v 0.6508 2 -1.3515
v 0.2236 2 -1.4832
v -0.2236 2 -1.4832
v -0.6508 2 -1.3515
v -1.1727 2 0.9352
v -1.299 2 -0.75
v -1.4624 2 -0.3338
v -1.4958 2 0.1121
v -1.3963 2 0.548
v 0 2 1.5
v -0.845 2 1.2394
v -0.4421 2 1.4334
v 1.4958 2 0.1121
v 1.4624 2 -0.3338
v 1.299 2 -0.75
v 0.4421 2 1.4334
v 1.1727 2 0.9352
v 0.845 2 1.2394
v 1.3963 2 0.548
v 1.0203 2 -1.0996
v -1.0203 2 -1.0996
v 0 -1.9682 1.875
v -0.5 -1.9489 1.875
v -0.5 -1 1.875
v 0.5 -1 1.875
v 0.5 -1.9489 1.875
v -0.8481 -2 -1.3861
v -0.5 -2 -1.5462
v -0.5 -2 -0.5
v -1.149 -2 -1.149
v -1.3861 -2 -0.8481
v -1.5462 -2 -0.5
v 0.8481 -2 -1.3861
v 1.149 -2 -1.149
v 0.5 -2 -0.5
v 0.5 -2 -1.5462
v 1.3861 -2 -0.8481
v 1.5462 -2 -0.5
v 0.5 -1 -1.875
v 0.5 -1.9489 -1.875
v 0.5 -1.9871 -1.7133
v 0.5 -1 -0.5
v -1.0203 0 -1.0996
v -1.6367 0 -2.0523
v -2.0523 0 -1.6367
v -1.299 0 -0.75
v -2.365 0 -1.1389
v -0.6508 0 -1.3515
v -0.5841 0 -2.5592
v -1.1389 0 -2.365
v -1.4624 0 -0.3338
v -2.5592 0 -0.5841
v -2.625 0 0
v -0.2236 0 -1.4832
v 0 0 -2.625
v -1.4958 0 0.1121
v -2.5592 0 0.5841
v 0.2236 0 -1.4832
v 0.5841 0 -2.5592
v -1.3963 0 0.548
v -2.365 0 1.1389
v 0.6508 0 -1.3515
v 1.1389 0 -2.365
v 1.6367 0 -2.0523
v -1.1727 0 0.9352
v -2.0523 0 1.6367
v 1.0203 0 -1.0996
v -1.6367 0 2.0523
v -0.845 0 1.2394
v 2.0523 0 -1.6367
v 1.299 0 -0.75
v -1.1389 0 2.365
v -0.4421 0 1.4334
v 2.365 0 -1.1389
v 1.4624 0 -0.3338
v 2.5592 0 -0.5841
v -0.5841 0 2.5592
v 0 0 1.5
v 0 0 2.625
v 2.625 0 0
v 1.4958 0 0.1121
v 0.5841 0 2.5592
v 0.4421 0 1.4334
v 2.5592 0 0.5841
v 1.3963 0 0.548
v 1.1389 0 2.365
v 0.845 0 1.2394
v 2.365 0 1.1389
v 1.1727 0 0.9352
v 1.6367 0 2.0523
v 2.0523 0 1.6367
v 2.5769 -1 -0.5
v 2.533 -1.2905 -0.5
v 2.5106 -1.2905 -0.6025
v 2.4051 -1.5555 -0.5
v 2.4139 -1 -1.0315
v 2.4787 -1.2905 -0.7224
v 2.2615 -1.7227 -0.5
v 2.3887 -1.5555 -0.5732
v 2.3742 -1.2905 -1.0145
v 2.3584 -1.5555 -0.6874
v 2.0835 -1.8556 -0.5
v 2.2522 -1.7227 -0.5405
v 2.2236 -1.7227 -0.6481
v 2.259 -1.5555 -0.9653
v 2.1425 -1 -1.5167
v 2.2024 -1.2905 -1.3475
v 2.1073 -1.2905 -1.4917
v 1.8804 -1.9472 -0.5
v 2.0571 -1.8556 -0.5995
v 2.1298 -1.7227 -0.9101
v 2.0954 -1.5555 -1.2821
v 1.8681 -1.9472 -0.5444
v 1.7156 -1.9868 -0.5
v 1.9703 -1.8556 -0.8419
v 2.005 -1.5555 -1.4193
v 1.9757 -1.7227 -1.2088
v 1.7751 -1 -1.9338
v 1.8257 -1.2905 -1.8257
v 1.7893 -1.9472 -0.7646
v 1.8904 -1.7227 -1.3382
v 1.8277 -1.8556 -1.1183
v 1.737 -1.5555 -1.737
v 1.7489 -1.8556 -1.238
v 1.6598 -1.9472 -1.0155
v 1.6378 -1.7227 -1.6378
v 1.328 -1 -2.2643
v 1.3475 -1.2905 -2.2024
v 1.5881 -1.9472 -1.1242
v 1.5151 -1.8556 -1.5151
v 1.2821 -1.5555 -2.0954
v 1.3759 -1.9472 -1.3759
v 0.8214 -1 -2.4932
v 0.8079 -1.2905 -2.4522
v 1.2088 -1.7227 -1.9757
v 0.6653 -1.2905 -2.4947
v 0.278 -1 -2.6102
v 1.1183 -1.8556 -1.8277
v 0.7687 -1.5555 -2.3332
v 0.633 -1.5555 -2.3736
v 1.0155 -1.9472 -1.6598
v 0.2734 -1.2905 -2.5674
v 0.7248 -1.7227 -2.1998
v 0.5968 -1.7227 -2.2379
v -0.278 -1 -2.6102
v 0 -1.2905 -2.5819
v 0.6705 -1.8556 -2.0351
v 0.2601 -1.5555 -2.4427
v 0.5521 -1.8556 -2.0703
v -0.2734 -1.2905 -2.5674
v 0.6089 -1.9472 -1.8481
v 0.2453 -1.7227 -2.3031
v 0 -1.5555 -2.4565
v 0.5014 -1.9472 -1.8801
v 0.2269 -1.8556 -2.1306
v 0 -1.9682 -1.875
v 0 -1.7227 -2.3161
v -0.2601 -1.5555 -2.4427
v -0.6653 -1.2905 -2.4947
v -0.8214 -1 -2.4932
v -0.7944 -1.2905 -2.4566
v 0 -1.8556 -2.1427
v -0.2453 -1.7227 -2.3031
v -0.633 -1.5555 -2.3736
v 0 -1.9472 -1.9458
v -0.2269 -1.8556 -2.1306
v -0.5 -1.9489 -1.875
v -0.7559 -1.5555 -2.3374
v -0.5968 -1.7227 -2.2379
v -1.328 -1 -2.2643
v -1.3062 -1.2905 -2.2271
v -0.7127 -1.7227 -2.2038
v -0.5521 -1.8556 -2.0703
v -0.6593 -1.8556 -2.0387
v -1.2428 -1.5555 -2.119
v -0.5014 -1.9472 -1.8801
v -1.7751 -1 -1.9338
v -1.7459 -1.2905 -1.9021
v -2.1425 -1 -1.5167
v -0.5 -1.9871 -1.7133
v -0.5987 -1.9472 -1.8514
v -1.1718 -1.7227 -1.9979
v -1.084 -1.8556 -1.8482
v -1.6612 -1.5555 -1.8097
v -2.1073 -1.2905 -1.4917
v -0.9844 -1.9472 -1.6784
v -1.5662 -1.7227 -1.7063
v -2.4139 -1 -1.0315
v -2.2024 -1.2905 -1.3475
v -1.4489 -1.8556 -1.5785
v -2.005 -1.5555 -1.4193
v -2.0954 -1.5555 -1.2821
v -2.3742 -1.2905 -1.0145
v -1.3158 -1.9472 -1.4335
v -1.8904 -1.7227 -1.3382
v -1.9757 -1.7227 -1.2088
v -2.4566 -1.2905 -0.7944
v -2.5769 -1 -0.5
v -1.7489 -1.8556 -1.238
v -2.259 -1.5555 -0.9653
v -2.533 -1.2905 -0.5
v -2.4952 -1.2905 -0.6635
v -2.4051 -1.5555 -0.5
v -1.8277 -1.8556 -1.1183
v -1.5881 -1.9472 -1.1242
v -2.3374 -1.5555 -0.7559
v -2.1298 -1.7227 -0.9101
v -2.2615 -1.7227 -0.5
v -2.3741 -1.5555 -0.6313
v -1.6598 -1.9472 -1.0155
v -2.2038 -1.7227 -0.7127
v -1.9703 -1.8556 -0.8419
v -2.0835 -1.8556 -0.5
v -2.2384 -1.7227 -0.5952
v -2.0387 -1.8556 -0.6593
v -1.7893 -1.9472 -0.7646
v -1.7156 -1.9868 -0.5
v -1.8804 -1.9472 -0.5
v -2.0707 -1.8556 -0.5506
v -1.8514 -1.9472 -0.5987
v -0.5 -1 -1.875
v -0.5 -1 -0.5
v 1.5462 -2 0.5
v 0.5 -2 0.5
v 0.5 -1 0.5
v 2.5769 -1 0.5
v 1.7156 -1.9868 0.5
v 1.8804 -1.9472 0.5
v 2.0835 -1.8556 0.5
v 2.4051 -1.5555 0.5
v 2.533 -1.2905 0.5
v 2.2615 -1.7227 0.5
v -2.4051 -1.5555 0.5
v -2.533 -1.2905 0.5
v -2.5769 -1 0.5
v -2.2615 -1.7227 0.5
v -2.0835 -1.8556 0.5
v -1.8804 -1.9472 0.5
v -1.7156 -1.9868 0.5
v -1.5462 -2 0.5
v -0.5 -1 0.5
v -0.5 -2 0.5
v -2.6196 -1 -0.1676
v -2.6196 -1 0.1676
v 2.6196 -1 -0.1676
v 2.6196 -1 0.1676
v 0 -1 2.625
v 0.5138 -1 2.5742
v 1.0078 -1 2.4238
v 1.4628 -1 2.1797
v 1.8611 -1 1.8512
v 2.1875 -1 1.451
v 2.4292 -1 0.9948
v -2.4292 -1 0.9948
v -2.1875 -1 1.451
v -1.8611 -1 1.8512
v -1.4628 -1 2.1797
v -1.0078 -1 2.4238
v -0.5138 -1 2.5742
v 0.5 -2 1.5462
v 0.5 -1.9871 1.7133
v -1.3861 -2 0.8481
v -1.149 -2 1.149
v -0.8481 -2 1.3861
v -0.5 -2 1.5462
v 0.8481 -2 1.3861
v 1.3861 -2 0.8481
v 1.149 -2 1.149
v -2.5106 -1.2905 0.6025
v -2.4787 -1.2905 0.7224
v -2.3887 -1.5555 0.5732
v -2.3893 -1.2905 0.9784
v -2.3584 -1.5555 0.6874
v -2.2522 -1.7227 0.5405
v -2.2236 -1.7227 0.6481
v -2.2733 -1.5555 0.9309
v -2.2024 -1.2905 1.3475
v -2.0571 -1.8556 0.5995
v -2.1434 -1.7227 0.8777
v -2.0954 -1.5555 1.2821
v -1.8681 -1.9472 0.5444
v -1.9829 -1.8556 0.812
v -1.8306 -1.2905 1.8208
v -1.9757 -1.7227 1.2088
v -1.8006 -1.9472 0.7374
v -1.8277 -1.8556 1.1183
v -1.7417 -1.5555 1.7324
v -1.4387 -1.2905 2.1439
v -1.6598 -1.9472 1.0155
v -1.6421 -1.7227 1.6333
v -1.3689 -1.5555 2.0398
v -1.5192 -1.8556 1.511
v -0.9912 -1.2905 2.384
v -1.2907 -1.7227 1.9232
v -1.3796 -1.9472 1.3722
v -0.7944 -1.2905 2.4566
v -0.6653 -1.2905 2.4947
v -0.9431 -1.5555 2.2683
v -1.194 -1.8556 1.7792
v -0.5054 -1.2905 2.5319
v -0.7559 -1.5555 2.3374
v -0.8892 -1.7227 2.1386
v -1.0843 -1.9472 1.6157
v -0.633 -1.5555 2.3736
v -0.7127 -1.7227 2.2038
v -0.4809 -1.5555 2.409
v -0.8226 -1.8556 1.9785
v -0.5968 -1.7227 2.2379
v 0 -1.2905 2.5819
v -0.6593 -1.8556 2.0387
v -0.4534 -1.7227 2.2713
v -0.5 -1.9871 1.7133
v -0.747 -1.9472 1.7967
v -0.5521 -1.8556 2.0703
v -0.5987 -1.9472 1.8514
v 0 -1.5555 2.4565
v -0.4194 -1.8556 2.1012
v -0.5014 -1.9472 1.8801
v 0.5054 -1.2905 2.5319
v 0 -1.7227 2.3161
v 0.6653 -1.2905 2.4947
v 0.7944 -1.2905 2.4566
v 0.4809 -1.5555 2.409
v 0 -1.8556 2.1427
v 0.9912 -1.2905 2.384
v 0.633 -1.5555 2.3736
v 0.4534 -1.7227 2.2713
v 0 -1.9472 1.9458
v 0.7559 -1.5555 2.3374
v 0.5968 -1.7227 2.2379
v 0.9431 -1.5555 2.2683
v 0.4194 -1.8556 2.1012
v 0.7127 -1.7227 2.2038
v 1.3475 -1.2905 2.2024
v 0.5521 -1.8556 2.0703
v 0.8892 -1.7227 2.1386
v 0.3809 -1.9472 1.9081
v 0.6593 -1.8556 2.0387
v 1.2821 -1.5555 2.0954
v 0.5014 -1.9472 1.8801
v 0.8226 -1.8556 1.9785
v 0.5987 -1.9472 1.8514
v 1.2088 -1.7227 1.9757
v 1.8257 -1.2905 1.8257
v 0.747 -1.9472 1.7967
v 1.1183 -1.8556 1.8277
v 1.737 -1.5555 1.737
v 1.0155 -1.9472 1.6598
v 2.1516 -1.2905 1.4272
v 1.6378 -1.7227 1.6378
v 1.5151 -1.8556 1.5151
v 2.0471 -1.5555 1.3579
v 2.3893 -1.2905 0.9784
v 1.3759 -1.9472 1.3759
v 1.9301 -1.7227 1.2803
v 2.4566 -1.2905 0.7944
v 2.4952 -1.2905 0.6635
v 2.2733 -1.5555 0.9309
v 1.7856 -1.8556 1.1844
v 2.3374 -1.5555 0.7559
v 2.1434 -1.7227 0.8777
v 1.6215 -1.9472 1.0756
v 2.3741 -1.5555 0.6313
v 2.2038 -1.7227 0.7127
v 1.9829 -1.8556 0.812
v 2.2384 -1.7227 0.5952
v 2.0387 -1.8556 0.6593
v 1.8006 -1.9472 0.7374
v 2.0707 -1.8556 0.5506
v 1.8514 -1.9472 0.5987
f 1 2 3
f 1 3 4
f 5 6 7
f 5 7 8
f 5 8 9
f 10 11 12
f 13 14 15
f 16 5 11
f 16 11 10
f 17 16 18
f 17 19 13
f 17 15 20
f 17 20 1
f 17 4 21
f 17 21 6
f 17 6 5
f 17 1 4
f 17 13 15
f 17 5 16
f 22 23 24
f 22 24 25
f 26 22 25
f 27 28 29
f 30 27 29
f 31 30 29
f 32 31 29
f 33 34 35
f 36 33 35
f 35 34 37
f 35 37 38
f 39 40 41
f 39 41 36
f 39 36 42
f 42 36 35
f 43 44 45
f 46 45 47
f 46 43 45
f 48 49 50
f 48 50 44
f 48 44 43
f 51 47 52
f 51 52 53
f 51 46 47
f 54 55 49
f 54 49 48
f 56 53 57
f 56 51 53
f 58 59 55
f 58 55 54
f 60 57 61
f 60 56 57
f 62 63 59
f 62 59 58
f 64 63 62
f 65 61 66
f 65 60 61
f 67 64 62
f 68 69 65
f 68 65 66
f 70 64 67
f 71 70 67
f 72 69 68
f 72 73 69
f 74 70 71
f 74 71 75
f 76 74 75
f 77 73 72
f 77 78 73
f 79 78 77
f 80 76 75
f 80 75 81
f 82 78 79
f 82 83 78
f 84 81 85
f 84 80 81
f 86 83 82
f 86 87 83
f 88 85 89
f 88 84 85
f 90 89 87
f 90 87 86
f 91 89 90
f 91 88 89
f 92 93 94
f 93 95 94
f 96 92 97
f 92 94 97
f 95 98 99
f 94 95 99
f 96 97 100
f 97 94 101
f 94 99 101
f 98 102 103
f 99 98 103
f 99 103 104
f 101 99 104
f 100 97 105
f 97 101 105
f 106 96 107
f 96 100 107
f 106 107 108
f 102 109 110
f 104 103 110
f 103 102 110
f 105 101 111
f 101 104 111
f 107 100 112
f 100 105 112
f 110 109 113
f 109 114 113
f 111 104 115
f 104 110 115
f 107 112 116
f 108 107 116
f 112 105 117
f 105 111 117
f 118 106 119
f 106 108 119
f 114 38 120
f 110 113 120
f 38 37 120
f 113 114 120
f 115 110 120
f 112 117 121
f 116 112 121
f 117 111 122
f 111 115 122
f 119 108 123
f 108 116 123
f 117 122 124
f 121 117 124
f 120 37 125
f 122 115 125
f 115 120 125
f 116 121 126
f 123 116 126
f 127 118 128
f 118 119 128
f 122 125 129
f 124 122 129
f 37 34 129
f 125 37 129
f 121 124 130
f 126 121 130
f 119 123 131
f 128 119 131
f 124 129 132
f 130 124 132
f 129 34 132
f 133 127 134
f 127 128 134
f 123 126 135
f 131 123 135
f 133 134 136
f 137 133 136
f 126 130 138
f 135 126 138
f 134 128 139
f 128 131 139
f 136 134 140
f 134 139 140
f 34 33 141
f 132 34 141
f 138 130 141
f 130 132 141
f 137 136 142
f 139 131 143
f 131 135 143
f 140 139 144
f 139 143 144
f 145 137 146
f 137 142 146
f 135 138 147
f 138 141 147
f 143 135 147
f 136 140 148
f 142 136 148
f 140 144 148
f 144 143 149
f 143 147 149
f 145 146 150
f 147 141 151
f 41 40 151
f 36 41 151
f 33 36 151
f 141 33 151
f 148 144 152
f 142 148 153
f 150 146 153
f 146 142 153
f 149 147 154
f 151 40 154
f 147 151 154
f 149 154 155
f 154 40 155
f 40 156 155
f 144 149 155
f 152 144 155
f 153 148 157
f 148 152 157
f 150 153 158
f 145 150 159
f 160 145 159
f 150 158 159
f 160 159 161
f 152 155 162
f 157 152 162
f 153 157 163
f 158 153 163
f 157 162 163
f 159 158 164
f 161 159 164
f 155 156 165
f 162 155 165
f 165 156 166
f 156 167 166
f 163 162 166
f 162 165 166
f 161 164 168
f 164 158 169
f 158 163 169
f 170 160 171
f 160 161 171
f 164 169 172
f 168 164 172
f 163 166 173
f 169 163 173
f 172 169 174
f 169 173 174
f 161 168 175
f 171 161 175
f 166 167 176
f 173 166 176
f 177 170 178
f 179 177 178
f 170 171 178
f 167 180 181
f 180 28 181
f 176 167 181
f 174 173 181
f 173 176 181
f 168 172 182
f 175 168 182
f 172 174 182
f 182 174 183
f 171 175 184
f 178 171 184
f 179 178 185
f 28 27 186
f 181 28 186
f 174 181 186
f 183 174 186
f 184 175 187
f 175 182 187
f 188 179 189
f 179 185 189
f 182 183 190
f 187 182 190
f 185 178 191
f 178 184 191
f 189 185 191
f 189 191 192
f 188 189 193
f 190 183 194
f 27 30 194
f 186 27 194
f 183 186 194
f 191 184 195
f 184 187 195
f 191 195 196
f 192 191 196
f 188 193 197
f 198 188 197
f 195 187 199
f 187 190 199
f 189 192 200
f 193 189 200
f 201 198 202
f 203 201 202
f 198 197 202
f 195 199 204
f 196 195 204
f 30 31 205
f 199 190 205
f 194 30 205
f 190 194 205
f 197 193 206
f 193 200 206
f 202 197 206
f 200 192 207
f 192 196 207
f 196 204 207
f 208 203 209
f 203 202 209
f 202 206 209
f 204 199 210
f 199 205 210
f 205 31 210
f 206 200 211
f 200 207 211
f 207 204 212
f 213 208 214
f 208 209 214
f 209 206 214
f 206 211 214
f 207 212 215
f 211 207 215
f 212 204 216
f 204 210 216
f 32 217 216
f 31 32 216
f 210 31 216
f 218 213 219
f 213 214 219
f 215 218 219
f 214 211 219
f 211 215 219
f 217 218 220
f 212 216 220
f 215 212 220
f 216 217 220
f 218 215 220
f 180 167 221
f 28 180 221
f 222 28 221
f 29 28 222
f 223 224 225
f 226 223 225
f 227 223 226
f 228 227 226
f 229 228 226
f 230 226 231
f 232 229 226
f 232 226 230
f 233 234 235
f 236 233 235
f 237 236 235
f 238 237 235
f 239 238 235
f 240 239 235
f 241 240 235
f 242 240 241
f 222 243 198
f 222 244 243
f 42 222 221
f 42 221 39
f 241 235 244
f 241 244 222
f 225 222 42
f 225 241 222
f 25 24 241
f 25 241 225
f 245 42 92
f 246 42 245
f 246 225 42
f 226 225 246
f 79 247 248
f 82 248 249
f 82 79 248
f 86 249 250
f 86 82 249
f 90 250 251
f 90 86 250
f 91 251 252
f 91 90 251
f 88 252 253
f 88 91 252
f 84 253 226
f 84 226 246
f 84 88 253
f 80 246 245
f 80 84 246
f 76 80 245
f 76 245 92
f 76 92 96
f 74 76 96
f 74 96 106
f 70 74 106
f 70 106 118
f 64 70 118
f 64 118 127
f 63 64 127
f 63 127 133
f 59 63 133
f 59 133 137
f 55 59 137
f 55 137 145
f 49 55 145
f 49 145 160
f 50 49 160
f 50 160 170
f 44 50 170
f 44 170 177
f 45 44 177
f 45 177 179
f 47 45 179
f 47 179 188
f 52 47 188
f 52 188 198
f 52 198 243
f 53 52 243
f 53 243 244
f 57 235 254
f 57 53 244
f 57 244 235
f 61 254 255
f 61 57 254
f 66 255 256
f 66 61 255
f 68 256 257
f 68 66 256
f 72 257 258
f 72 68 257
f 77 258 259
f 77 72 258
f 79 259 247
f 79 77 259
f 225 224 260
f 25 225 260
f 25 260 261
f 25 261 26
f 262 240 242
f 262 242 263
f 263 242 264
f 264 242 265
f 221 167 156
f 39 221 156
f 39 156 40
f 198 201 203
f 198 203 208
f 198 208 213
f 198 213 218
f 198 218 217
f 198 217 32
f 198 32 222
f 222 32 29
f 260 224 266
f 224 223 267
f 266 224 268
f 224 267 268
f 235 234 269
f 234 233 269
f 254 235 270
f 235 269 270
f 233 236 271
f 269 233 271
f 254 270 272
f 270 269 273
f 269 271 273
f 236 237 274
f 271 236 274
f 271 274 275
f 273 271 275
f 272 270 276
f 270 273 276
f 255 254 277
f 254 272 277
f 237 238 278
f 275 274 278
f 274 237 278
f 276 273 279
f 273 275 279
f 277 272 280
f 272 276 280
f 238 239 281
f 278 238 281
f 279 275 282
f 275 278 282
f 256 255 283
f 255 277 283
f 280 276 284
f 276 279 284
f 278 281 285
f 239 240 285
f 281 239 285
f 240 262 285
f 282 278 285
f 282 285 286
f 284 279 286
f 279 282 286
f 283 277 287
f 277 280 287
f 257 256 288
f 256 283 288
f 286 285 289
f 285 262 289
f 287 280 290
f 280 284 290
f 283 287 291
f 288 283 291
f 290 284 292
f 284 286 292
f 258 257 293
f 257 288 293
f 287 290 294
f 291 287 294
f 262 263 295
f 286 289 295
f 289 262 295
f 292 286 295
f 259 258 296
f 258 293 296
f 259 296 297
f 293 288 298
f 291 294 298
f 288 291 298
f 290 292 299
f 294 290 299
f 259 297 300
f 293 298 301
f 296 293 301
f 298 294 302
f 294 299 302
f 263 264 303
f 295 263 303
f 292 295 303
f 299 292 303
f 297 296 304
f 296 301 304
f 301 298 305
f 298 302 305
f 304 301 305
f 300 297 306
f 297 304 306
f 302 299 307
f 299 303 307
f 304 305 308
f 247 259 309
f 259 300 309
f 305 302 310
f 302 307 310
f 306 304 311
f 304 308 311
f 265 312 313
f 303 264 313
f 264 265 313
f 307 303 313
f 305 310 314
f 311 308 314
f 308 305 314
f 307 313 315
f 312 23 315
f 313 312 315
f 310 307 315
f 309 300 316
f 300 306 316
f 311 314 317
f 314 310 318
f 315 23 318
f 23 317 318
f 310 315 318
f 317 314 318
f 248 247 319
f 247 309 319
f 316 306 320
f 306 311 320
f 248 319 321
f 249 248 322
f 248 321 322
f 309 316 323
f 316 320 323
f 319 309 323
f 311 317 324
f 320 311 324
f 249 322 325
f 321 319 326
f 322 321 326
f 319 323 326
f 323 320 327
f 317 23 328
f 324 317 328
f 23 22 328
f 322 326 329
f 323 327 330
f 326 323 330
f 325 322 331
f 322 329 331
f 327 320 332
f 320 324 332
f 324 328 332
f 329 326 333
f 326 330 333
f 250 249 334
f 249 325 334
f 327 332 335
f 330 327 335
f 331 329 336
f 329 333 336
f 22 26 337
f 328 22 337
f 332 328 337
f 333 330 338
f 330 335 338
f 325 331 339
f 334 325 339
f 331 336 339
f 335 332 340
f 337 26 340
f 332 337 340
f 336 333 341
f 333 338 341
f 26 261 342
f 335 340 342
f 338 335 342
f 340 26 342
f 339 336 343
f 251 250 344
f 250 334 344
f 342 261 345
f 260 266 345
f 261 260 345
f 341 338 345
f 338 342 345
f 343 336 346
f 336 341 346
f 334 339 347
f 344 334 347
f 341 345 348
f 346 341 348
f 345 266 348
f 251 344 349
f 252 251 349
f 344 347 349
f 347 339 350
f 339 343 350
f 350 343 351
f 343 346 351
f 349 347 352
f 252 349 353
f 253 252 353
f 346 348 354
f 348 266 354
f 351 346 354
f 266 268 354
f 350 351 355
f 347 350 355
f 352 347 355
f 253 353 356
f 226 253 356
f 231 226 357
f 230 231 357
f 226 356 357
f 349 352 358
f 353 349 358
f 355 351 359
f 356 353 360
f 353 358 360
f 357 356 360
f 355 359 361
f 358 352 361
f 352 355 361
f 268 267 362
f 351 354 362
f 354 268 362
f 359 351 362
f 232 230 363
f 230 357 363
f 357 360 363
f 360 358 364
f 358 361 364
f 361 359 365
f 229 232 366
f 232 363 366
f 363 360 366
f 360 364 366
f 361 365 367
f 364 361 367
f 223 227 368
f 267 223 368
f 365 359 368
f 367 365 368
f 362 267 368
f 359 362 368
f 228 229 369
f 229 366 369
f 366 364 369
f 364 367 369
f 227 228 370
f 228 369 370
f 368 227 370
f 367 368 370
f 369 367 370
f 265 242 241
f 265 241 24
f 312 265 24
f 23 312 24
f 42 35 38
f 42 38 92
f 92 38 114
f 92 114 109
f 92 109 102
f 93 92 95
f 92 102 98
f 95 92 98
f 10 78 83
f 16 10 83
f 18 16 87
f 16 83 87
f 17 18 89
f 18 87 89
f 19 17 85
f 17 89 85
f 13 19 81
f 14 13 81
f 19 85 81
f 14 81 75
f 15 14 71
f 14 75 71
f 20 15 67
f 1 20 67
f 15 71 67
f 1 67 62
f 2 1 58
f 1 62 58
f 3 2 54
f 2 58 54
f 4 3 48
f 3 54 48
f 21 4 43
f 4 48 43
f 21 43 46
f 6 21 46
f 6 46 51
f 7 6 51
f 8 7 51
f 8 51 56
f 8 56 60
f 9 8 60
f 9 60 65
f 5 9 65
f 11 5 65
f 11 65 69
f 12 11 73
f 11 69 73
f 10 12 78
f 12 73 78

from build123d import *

# Parameters (mm, degrees)
SKETCH_1_R          = 1.5
EXTRUDE_1_DEPTH     = 2
SKETCH_2_R          = 2.625
EXTRUDE_2_DEPTH     = 2
FILLET_1_R          = 1
SKETCH_3_W          = 7.004697232
SKETCH_3_H          = 1
CUT_EXTRUDE_1_DEPTH = 1
SKETCH_4_W          = 1
SKETCH_4_H          = 3.75
CUT_EXTRUDE_2_DEPTH = 1


with BuildPart() as part:
    # 草图1 → 拉伸1 (new body)
    with BuildSketch(Plane(origin=(0, 0, 0), x_dir=(1, 0, 0), z_dir=(0, 1, 0))):
        Circle(SKETCH_1_R)
    extrude(amount=EXTRUDE_1_DEPTH)

    # 草图2 → Extrude 2 (add)
    with BuildSketch(Plane(origin=(0, 0, 0), x_dir=(-1, 0, 0), z_dir=(0, 1, 0))):
        Circle(SKETCH_2_R)
    extrude(amount=-EXTRUDE_2_DEPTH)

    # 圆角1
    fillet_1_edges = [part.edges().sort_by_distance(p)[0] for p in [
        (2.625, -2, 0),
    ]]
    fillet(fillet_1_edges, radius=FILLET_1_R)

    # 草图3 → 切除-拉伸1 (cut)
    with BuildSketch(Plane.XZ.offset(2)):
        Rectangle(SKETCH_3_W, SKETCH_3_H)
    extrude(amount=-CUT_EXTRUDE_1_DEPTH, mode=Mode.SUBTRACT)

    # 草图4 → 切除-拉伸2 (cut)
    with BuildSketch(Plane.XZ.offset(2)):
        Rectangle(SKETCH_4_W, SKETCH_4_H)
    extrude(amount=-CUT_EXTRUDE_2_DEPTH, mode=Mode.SUBTRACT)


solid = part.part
